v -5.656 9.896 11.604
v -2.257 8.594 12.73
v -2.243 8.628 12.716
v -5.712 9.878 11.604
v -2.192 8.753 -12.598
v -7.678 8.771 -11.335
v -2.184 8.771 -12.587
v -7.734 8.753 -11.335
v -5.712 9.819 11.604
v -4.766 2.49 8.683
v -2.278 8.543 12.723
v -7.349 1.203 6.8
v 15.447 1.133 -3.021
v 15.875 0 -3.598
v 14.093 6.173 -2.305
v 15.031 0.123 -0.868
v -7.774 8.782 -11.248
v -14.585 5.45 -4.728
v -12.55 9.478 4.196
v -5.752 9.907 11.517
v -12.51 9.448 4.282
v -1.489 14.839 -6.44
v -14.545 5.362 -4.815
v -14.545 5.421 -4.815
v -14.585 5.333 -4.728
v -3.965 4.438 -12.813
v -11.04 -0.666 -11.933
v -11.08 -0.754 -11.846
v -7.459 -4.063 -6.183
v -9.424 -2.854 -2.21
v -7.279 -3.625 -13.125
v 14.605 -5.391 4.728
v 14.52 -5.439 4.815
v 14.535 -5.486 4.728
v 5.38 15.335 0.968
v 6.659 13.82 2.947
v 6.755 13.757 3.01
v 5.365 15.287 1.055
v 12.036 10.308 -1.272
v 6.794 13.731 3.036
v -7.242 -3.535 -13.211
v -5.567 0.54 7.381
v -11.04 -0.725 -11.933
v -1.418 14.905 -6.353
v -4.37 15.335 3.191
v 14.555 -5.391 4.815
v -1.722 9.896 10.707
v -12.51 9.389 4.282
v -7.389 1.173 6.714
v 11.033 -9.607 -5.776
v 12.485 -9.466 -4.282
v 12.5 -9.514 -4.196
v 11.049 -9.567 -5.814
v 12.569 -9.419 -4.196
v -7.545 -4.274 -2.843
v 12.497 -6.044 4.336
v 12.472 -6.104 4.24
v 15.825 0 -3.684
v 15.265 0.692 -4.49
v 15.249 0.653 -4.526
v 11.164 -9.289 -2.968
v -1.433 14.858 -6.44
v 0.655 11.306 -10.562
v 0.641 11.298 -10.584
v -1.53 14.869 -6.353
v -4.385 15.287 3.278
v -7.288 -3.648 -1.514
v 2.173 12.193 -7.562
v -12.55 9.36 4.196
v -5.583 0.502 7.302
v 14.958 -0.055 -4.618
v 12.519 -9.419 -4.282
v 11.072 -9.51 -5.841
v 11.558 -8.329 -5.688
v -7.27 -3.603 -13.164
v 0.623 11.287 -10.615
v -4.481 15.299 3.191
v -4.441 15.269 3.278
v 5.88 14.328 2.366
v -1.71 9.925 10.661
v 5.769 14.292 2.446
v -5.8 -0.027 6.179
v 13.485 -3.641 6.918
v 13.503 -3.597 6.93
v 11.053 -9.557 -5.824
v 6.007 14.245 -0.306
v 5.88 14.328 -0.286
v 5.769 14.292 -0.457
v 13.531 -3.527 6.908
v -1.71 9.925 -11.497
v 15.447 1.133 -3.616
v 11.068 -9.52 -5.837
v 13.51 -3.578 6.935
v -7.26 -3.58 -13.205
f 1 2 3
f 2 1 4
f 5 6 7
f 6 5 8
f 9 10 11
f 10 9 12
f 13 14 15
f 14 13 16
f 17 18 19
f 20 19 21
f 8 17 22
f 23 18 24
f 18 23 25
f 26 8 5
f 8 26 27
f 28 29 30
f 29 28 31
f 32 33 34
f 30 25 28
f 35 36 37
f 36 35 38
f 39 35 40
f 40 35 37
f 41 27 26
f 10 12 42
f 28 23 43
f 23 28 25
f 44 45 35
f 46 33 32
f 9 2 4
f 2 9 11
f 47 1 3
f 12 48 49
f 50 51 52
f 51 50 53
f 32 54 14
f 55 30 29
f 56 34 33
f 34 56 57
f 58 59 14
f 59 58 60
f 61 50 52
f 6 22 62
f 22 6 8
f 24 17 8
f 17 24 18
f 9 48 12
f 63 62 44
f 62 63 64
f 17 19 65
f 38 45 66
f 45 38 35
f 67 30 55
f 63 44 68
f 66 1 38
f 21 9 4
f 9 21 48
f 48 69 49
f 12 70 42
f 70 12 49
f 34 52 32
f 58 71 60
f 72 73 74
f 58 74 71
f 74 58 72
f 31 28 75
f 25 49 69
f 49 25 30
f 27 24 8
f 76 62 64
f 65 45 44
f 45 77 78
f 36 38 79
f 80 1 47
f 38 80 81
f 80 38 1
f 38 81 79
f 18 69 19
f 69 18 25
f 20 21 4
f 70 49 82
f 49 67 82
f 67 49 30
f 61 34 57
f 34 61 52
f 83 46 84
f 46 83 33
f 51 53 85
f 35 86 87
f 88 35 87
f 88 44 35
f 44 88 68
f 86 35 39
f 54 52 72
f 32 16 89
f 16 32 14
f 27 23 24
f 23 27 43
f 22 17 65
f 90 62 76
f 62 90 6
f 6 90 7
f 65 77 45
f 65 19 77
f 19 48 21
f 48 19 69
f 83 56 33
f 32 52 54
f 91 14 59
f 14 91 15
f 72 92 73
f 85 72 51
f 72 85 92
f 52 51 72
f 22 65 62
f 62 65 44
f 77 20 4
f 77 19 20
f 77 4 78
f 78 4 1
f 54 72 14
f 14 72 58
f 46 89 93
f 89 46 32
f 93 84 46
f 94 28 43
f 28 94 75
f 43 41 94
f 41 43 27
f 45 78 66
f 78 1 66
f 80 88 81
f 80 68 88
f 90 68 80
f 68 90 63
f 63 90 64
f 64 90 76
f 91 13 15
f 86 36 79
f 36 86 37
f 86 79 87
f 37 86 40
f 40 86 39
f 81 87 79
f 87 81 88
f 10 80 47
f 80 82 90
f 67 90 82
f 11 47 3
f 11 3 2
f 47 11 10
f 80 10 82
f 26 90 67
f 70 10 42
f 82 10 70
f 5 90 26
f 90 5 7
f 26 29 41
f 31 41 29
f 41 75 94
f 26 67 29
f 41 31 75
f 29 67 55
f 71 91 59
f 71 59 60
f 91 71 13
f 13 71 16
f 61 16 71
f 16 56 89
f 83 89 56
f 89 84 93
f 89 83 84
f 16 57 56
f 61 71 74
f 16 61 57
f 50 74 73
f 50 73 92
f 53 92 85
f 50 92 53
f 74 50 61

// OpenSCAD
// Auto-generated OpenSCAD file

    inner_points = 10*[[1.6796923234637004e-13, 6.070021975389176e-13, -1.618033988749895], [-1.6796923234637004e-13, -6.070021975389176e-13, 1.618033988749895], [1.3099900587145907, 0.9497157652786637, 4.92274937759846e-13], [0.9497157652786637, -1.3099900587145907, -3.9284948324472034e-13], [0.948473340654347, 0.0700486920347792, -1.3090169943748227], [0.9484733406540753, 0.07004869203379704, 1.3090169943750722], [0.3615167180605155, 0.8796670732448667, -1.3090169943745797], [0.36151671806024377, 0.8796670732438845, 1.3090169943753152], [-0.36151671806024377, -0.8796670732438845, -1.3090169943753152], [-0.3615167180605155, -0.8796670732448667, 1.3090169943745797], [1.5346621026017229, 0.11334116457913979, -0.49999999999979816], [1.5346621026016192, 0.11334116457876464, 0.5000000000002018], [0.5849463373230591, 1.4233312232937305, -0.49999999999940536], [0.5849463373229553, 1.4233312232933555, 0.5000000000005946], [-0.5849463373229553, -1.4233312232933555, -0.5000000000005946], [-0.5849463373230591, -1.4233312232937305, 0.49999999999940536], [1.173145384541375, -0.7663259086651197, -0.8090169943751132], [1.1731453845412072, -0.766325908665727, 0.8090169943747817], [0.36352700333128773, -1.3532825312589511, -0.8090169943754174], [0.36352700333111987, -1.3532825312595584, 0.8090169943744775], [-0.1629176159415796, 0.9866396760803366, 3.5322329978742213e-13], [-0.7478639532645349, -0.4366915472130185, -0.5000000000002415], [-0.7478639532646387, -0.4366915472133937, 0.4999999999997586], [-0.3863472352041232, 0.4429755260314729, -0.8090169943748214], [-0.38634723520429115, 0.44297552603086593, 0.8090169943750735]];

    outer_points = 10*[[0.3292875792170331, 0.6516523075520398, 1.4439366152935462], [-0.3292875792170331, -0.6516523075520398, -1.4439366152935462], [1.5775331980706784, 0.0, -0.35975407952487837], [-0.14488853615168673, 1.4810075147722905, -0.6353408864772672], [1.0103928266975255, 0.9848542820948938, 0.7919610896675606], [0.4775943314511925, -0.06954130037160627, -1.5443774314778784], [1.0999388666194858, 0.06954130037160627, 1.184623351953], [0.5671403713731528, -0.9848542820948938, -1.151715169192439], [-0.5671403713731528, 0.9848542820948938, 1.151715169192439], [-1.0999388666194858, -0.06954130037160627, -1.184623351953], [1.3055623563686454, 0.9418753948433755, -0.16251665444403007], [1.1020514403393455, 0.5391321199289151, -1.0549185602959228], [1.450450892520332, -0.5391321199289151, 0.4728242320332371], [1.2469399764910323, -0.9418753948433755, -0.41957767381865574], [-1.2469399764910323, 0.9418753948433755, 0.41957767381865574], [-1.450450892520332, 0.5391321199289151, -0.4728242320332371], [0.5349110689661927, 1.523986402023809, 0.09679660889651609], [0.20562348974915956, 0.8723340944717692, -1.34714000639703], [-0.4400580658228066, 1.523986402023809, 0.31913685763432353], [-0.7693456450398397, 0.8723340944717692, -1.1247997576592228], [0.5161118652230368, -0.8186808191285174, 0.25177422220524803], [-0.7308281112679954, 0.12319457571485803, 0.6713518960239038], [-0.9343390272972953, -0.27954869919960235, -0.22105000982798903], [0.16559983932219047, -0.21000739882799596, 0.9635733421250111], [-0.16368773989484264, -0.8616597063800358, -0.48036327316853505]];

    // Convex hull for inner set (I)
    module inner_hull() {
        hull() {
            for (p = inner_points) {
                translate(p) sphere(r=0.1);
            }
        }
    }

    // Convex hull for outer set (O) minus inner hull (O \ I)
    module outer_minus_inner() {
        difference() {
            hull() {
                for (p = outer_points) {
                    translate(p) sphere(r=0.1);
                }
            }
            inner_hull(); // Subtract inner hull
        }
    }

    // Convex hull for outer set (O) minus all translated inner hulls
    module outer_minus_AllTranslationInner() {
        difference() {
            hull() {
                for (p = outer_points) {
                    translate(p) sphere(r=0.1);
                }
            }
            hull() {
                translate([0,0,50]) inner_hull();
                translate([0,0,-50]) inner_hull();
            }; // Subtract translated inner hulls
        }
    }

    // Difference between outer_minus_inner and outer_minus_AllTranslationInner
    module outer_minus_inner_diff() {
        difference() {
            // Outer minus inner
            difference() {
                hull() {
                    for (p = outer_points) {
                        translate(p) sphere(r=0.1);
                    }
                }
                inner_hull();
            }

            // Subtract Outer minus AllTranslationInner
            difference() {
                hull() {
                    for (p = outer_points) {
                        translate(p) sphere(r=0.1);
                    }
                }
                hull() {
                    translate([0,0,50]) inner_hull();
                    translate([0,0,-50]) inner_hull();
                };
            }
        }
    }

    // Rendering all with colors applied
    color([0, 1, 0, 1]) outer_minus_AllTranslationInner(); // Opaque green
    
